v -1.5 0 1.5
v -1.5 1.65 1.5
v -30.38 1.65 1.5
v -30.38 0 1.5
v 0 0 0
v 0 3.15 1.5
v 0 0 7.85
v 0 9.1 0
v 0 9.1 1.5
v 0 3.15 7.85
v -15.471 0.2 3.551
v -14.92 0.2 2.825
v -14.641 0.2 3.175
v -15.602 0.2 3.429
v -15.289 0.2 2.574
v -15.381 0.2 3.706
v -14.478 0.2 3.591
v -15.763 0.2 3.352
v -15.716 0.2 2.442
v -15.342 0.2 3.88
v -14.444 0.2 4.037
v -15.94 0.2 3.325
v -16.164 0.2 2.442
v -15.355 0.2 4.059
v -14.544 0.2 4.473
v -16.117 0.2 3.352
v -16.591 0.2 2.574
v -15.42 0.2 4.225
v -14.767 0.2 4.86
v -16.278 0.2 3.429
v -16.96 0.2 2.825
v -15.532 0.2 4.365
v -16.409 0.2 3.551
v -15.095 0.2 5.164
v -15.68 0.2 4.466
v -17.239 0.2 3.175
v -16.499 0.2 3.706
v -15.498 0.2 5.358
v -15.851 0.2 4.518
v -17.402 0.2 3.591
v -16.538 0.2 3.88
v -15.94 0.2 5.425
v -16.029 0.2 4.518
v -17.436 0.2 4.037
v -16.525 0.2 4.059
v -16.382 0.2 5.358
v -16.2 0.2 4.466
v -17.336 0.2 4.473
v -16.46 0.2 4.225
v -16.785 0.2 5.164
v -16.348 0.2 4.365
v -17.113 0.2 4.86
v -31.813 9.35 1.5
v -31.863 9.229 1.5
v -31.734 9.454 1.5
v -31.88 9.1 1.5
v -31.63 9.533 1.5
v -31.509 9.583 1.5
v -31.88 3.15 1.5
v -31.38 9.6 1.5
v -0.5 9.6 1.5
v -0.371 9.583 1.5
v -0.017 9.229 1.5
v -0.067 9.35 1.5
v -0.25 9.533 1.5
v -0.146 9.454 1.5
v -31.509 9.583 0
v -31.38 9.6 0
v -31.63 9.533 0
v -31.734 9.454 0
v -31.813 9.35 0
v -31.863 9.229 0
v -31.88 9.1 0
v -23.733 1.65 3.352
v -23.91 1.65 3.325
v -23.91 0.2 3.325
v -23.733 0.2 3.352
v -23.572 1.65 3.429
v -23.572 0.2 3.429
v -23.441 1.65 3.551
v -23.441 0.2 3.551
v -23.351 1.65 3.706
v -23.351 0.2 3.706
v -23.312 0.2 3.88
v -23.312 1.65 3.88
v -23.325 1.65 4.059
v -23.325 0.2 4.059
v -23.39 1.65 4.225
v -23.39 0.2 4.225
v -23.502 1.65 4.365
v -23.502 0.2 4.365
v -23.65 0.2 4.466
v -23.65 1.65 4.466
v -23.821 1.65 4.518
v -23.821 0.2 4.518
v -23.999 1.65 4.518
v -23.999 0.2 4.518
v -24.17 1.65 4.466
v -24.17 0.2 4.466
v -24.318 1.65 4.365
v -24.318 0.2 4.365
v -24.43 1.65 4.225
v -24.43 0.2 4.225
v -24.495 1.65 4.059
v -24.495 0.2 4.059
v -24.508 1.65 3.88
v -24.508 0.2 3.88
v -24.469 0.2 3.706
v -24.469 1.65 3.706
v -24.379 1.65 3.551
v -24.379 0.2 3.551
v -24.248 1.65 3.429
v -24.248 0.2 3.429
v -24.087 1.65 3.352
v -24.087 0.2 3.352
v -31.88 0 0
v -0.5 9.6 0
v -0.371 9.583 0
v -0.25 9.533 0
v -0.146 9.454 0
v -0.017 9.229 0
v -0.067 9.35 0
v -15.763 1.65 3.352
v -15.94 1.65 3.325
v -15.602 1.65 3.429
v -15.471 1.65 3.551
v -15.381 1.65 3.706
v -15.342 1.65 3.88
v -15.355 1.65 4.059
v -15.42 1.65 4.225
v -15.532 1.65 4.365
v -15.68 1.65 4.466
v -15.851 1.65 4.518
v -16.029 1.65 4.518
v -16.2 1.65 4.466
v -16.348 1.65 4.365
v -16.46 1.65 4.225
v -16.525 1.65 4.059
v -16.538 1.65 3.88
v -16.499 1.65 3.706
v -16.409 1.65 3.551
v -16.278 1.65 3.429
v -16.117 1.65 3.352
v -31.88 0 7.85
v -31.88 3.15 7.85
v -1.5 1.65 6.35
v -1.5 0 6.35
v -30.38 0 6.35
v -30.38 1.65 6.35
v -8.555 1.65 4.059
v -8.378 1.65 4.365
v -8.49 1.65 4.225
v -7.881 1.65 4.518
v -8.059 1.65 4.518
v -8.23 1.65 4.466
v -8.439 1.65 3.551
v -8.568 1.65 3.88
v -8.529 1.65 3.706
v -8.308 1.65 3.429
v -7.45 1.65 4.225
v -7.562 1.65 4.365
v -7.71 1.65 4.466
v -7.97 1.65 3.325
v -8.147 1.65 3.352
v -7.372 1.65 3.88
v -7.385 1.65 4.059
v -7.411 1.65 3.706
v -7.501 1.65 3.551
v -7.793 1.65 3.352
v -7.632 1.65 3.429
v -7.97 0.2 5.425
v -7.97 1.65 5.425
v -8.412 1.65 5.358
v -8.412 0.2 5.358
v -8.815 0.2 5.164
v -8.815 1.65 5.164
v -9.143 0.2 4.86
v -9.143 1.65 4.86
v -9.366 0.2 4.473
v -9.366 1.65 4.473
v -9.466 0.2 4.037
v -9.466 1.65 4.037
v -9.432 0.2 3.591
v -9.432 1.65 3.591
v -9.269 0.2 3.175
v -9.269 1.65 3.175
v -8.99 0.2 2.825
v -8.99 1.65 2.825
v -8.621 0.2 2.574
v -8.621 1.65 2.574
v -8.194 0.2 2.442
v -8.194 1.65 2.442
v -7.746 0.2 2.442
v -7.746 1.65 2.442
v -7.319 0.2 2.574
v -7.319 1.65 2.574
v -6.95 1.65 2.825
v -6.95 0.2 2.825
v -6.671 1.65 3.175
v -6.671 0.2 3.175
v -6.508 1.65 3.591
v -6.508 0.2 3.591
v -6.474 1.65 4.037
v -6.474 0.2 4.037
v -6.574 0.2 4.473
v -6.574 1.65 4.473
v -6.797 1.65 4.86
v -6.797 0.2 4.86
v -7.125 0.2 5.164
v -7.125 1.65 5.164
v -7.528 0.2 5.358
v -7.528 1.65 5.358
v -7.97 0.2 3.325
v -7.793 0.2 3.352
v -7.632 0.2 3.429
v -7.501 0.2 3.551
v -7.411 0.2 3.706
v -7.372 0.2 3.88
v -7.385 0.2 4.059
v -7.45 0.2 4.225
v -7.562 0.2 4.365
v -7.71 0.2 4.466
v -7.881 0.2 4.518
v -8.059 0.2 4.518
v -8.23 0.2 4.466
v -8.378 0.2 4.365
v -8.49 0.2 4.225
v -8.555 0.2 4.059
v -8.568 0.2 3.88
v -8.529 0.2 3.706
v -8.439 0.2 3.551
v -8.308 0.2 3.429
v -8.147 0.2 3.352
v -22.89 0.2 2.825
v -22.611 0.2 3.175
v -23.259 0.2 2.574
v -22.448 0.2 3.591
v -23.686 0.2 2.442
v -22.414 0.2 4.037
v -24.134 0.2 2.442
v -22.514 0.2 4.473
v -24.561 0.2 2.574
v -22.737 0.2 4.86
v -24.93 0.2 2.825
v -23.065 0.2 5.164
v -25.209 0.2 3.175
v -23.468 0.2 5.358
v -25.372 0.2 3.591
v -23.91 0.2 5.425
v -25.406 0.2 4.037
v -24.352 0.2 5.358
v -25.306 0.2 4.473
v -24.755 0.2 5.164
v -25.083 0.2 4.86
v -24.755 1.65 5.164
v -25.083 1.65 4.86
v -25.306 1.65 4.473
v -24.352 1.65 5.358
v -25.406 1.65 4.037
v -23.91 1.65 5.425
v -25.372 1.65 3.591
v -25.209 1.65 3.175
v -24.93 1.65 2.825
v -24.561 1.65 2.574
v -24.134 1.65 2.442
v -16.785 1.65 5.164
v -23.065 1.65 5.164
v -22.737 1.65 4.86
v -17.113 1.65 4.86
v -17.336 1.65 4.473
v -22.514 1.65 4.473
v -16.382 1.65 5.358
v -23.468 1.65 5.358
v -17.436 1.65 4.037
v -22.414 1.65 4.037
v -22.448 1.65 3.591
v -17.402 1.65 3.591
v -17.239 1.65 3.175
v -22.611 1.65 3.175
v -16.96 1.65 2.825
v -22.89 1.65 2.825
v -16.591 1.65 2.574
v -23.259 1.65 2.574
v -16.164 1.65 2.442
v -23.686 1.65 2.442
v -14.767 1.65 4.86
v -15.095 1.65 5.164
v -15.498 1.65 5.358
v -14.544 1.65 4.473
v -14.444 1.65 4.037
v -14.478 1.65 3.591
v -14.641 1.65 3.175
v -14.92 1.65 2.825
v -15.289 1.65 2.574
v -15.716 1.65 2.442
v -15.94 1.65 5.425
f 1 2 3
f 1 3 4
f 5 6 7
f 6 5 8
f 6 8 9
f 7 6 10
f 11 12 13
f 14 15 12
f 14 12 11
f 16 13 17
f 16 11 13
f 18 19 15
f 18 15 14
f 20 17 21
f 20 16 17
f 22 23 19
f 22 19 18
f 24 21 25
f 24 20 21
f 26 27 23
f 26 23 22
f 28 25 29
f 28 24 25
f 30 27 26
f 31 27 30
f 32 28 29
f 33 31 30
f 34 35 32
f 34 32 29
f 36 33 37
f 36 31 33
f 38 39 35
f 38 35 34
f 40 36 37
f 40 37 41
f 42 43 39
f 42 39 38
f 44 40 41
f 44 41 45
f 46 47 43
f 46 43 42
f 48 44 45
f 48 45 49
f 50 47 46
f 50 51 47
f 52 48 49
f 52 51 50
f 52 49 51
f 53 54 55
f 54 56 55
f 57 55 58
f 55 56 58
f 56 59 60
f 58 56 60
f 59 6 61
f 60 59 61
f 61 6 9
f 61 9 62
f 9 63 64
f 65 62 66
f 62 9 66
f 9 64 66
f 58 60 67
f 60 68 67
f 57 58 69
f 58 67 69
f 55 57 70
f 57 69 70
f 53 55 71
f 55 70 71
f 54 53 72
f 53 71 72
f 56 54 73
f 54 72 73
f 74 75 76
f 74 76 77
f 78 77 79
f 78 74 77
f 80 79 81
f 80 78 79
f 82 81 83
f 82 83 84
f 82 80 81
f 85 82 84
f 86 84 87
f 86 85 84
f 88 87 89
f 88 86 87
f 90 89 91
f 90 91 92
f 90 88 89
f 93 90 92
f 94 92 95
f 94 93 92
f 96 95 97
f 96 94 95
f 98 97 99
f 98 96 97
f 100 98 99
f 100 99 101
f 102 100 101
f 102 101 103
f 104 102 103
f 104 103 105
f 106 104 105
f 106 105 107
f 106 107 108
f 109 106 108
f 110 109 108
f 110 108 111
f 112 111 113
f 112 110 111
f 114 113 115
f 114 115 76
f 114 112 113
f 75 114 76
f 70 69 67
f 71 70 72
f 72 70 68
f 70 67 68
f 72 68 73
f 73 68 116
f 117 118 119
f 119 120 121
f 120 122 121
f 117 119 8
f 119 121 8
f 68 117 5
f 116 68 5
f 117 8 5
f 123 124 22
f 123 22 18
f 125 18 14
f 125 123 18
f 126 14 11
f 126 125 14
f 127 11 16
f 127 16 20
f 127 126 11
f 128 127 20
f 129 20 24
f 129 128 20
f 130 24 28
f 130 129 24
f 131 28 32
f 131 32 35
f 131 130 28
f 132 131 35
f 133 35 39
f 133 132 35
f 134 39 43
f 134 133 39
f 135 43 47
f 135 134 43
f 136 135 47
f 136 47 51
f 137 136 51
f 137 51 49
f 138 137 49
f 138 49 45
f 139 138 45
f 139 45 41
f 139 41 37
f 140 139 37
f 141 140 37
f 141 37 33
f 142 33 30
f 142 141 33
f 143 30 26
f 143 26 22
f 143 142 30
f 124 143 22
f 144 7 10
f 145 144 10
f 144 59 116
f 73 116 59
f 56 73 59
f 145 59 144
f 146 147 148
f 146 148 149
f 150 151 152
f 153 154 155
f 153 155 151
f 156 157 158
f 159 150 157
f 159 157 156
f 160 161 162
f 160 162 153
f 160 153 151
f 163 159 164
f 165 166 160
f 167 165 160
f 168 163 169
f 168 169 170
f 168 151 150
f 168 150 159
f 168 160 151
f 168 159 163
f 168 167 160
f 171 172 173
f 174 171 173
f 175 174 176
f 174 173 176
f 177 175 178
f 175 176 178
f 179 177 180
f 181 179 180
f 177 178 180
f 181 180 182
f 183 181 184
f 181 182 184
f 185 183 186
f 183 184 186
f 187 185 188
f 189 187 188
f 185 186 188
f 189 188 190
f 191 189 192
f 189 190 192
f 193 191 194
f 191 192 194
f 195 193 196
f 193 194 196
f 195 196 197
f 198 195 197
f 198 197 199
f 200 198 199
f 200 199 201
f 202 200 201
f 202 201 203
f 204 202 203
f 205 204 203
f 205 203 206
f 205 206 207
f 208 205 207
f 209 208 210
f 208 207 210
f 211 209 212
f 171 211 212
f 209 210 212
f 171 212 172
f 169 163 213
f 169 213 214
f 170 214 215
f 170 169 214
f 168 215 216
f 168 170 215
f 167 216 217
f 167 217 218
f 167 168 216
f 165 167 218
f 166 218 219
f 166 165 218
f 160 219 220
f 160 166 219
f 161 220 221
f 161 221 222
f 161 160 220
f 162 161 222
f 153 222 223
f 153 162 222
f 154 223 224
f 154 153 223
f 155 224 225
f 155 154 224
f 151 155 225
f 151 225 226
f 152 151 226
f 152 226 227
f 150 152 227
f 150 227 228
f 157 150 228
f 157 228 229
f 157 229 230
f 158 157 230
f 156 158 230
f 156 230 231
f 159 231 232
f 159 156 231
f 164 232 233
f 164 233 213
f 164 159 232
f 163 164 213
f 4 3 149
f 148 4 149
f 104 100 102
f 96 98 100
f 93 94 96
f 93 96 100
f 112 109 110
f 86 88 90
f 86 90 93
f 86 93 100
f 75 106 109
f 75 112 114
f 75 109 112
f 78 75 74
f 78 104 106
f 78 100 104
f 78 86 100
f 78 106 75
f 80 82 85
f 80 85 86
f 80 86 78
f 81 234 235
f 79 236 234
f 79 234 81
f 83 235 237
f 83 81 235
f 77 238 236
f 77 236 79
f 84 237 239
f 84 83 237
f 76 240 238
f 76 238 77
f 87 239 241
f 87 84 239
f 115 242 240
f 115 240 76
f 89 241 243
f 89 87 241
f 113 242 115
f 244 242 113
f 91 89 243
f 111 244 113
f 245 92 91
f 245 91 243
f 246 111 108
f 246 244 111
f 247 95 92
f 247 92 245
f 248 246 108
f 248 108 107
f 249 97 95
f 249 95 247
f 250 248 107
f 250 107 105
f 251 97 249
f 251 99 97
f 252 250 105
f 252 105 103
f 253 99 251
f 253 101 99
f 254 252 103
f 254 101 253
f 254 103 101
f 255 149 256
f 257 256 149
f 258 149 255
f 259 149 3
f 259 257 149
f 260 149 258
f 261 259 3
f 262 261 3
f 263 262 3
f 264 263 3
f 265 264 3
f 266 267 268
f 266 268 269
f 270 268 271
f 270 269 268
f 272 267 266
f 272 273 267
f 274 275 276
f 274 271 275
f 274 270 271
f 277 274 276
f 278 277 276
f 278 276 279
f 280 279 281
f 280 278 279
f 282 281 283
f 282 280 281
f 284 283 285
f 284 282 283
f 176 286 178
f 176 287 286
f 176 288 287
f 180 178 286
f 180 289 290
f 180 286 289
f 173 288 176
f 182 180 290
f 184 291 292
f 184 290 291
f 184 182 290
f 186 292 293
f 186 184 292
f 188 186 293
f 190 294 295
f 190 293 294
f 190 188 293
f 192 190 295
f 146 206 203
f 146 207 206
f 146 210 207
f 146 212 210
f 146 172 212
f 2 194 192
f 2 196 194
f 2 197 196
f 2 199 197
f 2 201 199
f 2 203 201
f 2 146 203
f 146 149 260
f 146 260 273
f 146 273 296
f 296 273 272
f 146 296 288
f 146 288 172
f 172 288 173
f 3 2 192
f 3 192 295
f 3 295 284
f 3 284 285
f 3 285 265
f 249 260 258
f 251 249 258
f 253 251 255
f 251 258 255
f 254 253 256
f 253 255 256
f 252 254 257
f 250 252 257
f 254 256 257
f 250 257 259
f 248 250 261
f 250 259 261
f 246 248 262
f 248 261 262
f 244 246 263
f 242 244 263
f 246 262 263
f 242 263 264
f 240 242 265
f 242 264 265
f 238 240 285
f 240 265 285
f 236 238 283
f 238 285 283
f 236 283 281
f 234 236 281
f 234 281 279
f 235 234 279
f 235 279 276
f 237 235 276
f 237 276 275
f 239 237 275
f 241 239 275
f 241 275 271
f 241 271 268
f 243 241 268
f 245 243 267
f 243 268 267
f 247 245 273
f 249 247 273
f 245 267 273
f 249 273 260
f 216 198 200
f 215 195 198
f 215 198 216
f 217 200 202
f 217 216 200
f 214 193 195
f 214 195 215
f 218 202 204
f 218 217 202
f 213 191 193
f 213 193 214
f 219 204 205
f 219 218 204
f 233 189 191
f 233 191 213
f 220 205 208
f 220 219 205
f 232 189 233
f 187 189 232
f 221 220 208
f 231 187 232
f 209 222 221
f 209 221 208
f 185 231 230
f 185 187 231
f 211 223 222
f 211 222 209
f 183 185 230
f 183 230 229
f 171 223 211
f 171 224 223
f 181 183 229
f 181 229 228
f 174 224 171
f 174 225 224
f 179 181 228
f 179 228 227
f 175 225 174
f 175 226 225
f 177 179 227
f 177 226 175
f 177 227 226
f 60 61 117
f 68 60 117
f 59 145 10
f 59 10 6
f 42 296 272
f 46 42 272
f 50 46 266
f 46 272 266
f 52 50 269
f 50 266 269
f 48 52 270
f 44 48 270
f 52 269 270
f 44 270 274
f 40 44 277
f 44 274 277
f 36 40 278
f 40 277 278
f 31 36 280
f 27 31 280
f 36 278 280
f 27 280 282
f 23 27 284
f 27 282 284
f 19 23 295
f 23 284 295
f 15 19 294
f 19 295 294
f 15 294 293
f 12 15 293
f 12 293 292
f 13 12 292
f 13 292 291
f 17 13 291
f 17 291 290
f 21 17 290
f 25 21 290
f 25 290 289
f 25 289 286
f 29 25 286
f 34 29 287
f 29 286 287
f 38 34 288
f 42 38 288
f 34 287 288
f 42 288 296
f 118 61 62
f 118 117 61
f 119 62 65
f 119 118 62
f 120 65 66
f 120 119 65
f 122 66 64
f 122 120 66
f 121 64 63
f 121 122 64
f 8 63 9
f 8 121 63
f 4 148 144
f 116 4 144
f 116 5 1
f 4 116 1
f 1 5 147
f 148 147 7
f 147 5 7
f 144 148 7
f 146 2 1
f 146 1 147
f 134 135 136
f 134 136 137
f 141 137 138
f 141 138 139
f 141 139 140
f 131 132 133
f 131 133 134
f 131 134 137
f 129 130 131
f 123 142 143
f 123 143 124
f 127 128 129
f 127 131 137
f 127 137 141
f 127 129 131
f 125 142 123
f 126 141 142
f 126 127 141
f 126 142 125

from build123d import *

# Parameters (mm, degrees)
BOSS_EXTRUDE1_DEPTH = 31.88
FILLET1_R           = 0.5
SHELL1_T            = -1.5
SKETCH2_R           = 1.5
SKETCH2_R_2         = 0.6
BOSS_EXTRUDE2_DEPTH = 1.45


with BuildPart() as part:
    # Sketch1 → Boss-Extrude1 (new body)
    with BuildSketch(Plane(origin=(0, 0, 0), x_dir=(0, 0, -1), z_dir=(1, 0, 0))):
        Polygon((0, 0), (-7.85, 0), (-7.85, 3.15), (-1.5, 3.15), (-1.5, 9.6), (0, 9.6), align=None)
    extrude(amount=-BOSS_EXTRUDE1_DEPTH)

    # Fillet1
    fillet1_edges = [part.edges().sort_by_distance(p)[0] for p in [
        (0, 9.6, 0.75),
        (-31.88, 9.6, 0.75),
    ]]
    fillet(fillet1_edges, radius=FILLET1_R)

    # Shell1
    shell1_openings = [part.faces().sort_by_distance(p)[0] for p in [
        (-15.94, 0, 3.925),
    ]]
    offset(amount=SHELL1_T, openings=shell1_openings, kind=Kind.INTERSECTION)

    # Sketch2 → Boss-Extrude2 (add)
    # profile 1 of 3: a face of its own
    with BuildSketch(Plane.XZ.offset(-1.65)):
        with Locations(Location((-23.91, 3.925, 0), (0, 0, 90))):
            Circle(SKETCH2_R)
        with Locations(Location((-23.91, 3.925, 0), (0, 0, 270))):
            Circle(SKETCH2_R_2, mode=Mode.SUBTRACT)
    # profile 2 of 3: a face of its own
    with BuildSketch(Plane.XZ.offset(-1.65)):
        with Locations(Location((-15.94, 3.925, 0), (0, 0, 90))):
            Circle(SKETCH2_R)
        with Locations(Location((-15.94, 3.925, 0), (0, 0, 270))):
            Circle(SKETCH2_R_2, mode=Mode.SUBTRACT)
    # profile 3 of 3: a face of its own
    with BuildSketch(Plane.XZ.offset(-1.65)):
        with Locations(Location((-7.97, 3.925, 0), (0, 0, 90))):
            Circle(SKETCH2_R)
        with Locations(Location((-7.97, 3.925, 0), (0, 0, 270))):
            Circle(SKETCH2_R_2, mode=Mode.SUBTRACT)
    extrude(amount=BOSS_EXTRUDE2_DEPTH)


solid = part.part
